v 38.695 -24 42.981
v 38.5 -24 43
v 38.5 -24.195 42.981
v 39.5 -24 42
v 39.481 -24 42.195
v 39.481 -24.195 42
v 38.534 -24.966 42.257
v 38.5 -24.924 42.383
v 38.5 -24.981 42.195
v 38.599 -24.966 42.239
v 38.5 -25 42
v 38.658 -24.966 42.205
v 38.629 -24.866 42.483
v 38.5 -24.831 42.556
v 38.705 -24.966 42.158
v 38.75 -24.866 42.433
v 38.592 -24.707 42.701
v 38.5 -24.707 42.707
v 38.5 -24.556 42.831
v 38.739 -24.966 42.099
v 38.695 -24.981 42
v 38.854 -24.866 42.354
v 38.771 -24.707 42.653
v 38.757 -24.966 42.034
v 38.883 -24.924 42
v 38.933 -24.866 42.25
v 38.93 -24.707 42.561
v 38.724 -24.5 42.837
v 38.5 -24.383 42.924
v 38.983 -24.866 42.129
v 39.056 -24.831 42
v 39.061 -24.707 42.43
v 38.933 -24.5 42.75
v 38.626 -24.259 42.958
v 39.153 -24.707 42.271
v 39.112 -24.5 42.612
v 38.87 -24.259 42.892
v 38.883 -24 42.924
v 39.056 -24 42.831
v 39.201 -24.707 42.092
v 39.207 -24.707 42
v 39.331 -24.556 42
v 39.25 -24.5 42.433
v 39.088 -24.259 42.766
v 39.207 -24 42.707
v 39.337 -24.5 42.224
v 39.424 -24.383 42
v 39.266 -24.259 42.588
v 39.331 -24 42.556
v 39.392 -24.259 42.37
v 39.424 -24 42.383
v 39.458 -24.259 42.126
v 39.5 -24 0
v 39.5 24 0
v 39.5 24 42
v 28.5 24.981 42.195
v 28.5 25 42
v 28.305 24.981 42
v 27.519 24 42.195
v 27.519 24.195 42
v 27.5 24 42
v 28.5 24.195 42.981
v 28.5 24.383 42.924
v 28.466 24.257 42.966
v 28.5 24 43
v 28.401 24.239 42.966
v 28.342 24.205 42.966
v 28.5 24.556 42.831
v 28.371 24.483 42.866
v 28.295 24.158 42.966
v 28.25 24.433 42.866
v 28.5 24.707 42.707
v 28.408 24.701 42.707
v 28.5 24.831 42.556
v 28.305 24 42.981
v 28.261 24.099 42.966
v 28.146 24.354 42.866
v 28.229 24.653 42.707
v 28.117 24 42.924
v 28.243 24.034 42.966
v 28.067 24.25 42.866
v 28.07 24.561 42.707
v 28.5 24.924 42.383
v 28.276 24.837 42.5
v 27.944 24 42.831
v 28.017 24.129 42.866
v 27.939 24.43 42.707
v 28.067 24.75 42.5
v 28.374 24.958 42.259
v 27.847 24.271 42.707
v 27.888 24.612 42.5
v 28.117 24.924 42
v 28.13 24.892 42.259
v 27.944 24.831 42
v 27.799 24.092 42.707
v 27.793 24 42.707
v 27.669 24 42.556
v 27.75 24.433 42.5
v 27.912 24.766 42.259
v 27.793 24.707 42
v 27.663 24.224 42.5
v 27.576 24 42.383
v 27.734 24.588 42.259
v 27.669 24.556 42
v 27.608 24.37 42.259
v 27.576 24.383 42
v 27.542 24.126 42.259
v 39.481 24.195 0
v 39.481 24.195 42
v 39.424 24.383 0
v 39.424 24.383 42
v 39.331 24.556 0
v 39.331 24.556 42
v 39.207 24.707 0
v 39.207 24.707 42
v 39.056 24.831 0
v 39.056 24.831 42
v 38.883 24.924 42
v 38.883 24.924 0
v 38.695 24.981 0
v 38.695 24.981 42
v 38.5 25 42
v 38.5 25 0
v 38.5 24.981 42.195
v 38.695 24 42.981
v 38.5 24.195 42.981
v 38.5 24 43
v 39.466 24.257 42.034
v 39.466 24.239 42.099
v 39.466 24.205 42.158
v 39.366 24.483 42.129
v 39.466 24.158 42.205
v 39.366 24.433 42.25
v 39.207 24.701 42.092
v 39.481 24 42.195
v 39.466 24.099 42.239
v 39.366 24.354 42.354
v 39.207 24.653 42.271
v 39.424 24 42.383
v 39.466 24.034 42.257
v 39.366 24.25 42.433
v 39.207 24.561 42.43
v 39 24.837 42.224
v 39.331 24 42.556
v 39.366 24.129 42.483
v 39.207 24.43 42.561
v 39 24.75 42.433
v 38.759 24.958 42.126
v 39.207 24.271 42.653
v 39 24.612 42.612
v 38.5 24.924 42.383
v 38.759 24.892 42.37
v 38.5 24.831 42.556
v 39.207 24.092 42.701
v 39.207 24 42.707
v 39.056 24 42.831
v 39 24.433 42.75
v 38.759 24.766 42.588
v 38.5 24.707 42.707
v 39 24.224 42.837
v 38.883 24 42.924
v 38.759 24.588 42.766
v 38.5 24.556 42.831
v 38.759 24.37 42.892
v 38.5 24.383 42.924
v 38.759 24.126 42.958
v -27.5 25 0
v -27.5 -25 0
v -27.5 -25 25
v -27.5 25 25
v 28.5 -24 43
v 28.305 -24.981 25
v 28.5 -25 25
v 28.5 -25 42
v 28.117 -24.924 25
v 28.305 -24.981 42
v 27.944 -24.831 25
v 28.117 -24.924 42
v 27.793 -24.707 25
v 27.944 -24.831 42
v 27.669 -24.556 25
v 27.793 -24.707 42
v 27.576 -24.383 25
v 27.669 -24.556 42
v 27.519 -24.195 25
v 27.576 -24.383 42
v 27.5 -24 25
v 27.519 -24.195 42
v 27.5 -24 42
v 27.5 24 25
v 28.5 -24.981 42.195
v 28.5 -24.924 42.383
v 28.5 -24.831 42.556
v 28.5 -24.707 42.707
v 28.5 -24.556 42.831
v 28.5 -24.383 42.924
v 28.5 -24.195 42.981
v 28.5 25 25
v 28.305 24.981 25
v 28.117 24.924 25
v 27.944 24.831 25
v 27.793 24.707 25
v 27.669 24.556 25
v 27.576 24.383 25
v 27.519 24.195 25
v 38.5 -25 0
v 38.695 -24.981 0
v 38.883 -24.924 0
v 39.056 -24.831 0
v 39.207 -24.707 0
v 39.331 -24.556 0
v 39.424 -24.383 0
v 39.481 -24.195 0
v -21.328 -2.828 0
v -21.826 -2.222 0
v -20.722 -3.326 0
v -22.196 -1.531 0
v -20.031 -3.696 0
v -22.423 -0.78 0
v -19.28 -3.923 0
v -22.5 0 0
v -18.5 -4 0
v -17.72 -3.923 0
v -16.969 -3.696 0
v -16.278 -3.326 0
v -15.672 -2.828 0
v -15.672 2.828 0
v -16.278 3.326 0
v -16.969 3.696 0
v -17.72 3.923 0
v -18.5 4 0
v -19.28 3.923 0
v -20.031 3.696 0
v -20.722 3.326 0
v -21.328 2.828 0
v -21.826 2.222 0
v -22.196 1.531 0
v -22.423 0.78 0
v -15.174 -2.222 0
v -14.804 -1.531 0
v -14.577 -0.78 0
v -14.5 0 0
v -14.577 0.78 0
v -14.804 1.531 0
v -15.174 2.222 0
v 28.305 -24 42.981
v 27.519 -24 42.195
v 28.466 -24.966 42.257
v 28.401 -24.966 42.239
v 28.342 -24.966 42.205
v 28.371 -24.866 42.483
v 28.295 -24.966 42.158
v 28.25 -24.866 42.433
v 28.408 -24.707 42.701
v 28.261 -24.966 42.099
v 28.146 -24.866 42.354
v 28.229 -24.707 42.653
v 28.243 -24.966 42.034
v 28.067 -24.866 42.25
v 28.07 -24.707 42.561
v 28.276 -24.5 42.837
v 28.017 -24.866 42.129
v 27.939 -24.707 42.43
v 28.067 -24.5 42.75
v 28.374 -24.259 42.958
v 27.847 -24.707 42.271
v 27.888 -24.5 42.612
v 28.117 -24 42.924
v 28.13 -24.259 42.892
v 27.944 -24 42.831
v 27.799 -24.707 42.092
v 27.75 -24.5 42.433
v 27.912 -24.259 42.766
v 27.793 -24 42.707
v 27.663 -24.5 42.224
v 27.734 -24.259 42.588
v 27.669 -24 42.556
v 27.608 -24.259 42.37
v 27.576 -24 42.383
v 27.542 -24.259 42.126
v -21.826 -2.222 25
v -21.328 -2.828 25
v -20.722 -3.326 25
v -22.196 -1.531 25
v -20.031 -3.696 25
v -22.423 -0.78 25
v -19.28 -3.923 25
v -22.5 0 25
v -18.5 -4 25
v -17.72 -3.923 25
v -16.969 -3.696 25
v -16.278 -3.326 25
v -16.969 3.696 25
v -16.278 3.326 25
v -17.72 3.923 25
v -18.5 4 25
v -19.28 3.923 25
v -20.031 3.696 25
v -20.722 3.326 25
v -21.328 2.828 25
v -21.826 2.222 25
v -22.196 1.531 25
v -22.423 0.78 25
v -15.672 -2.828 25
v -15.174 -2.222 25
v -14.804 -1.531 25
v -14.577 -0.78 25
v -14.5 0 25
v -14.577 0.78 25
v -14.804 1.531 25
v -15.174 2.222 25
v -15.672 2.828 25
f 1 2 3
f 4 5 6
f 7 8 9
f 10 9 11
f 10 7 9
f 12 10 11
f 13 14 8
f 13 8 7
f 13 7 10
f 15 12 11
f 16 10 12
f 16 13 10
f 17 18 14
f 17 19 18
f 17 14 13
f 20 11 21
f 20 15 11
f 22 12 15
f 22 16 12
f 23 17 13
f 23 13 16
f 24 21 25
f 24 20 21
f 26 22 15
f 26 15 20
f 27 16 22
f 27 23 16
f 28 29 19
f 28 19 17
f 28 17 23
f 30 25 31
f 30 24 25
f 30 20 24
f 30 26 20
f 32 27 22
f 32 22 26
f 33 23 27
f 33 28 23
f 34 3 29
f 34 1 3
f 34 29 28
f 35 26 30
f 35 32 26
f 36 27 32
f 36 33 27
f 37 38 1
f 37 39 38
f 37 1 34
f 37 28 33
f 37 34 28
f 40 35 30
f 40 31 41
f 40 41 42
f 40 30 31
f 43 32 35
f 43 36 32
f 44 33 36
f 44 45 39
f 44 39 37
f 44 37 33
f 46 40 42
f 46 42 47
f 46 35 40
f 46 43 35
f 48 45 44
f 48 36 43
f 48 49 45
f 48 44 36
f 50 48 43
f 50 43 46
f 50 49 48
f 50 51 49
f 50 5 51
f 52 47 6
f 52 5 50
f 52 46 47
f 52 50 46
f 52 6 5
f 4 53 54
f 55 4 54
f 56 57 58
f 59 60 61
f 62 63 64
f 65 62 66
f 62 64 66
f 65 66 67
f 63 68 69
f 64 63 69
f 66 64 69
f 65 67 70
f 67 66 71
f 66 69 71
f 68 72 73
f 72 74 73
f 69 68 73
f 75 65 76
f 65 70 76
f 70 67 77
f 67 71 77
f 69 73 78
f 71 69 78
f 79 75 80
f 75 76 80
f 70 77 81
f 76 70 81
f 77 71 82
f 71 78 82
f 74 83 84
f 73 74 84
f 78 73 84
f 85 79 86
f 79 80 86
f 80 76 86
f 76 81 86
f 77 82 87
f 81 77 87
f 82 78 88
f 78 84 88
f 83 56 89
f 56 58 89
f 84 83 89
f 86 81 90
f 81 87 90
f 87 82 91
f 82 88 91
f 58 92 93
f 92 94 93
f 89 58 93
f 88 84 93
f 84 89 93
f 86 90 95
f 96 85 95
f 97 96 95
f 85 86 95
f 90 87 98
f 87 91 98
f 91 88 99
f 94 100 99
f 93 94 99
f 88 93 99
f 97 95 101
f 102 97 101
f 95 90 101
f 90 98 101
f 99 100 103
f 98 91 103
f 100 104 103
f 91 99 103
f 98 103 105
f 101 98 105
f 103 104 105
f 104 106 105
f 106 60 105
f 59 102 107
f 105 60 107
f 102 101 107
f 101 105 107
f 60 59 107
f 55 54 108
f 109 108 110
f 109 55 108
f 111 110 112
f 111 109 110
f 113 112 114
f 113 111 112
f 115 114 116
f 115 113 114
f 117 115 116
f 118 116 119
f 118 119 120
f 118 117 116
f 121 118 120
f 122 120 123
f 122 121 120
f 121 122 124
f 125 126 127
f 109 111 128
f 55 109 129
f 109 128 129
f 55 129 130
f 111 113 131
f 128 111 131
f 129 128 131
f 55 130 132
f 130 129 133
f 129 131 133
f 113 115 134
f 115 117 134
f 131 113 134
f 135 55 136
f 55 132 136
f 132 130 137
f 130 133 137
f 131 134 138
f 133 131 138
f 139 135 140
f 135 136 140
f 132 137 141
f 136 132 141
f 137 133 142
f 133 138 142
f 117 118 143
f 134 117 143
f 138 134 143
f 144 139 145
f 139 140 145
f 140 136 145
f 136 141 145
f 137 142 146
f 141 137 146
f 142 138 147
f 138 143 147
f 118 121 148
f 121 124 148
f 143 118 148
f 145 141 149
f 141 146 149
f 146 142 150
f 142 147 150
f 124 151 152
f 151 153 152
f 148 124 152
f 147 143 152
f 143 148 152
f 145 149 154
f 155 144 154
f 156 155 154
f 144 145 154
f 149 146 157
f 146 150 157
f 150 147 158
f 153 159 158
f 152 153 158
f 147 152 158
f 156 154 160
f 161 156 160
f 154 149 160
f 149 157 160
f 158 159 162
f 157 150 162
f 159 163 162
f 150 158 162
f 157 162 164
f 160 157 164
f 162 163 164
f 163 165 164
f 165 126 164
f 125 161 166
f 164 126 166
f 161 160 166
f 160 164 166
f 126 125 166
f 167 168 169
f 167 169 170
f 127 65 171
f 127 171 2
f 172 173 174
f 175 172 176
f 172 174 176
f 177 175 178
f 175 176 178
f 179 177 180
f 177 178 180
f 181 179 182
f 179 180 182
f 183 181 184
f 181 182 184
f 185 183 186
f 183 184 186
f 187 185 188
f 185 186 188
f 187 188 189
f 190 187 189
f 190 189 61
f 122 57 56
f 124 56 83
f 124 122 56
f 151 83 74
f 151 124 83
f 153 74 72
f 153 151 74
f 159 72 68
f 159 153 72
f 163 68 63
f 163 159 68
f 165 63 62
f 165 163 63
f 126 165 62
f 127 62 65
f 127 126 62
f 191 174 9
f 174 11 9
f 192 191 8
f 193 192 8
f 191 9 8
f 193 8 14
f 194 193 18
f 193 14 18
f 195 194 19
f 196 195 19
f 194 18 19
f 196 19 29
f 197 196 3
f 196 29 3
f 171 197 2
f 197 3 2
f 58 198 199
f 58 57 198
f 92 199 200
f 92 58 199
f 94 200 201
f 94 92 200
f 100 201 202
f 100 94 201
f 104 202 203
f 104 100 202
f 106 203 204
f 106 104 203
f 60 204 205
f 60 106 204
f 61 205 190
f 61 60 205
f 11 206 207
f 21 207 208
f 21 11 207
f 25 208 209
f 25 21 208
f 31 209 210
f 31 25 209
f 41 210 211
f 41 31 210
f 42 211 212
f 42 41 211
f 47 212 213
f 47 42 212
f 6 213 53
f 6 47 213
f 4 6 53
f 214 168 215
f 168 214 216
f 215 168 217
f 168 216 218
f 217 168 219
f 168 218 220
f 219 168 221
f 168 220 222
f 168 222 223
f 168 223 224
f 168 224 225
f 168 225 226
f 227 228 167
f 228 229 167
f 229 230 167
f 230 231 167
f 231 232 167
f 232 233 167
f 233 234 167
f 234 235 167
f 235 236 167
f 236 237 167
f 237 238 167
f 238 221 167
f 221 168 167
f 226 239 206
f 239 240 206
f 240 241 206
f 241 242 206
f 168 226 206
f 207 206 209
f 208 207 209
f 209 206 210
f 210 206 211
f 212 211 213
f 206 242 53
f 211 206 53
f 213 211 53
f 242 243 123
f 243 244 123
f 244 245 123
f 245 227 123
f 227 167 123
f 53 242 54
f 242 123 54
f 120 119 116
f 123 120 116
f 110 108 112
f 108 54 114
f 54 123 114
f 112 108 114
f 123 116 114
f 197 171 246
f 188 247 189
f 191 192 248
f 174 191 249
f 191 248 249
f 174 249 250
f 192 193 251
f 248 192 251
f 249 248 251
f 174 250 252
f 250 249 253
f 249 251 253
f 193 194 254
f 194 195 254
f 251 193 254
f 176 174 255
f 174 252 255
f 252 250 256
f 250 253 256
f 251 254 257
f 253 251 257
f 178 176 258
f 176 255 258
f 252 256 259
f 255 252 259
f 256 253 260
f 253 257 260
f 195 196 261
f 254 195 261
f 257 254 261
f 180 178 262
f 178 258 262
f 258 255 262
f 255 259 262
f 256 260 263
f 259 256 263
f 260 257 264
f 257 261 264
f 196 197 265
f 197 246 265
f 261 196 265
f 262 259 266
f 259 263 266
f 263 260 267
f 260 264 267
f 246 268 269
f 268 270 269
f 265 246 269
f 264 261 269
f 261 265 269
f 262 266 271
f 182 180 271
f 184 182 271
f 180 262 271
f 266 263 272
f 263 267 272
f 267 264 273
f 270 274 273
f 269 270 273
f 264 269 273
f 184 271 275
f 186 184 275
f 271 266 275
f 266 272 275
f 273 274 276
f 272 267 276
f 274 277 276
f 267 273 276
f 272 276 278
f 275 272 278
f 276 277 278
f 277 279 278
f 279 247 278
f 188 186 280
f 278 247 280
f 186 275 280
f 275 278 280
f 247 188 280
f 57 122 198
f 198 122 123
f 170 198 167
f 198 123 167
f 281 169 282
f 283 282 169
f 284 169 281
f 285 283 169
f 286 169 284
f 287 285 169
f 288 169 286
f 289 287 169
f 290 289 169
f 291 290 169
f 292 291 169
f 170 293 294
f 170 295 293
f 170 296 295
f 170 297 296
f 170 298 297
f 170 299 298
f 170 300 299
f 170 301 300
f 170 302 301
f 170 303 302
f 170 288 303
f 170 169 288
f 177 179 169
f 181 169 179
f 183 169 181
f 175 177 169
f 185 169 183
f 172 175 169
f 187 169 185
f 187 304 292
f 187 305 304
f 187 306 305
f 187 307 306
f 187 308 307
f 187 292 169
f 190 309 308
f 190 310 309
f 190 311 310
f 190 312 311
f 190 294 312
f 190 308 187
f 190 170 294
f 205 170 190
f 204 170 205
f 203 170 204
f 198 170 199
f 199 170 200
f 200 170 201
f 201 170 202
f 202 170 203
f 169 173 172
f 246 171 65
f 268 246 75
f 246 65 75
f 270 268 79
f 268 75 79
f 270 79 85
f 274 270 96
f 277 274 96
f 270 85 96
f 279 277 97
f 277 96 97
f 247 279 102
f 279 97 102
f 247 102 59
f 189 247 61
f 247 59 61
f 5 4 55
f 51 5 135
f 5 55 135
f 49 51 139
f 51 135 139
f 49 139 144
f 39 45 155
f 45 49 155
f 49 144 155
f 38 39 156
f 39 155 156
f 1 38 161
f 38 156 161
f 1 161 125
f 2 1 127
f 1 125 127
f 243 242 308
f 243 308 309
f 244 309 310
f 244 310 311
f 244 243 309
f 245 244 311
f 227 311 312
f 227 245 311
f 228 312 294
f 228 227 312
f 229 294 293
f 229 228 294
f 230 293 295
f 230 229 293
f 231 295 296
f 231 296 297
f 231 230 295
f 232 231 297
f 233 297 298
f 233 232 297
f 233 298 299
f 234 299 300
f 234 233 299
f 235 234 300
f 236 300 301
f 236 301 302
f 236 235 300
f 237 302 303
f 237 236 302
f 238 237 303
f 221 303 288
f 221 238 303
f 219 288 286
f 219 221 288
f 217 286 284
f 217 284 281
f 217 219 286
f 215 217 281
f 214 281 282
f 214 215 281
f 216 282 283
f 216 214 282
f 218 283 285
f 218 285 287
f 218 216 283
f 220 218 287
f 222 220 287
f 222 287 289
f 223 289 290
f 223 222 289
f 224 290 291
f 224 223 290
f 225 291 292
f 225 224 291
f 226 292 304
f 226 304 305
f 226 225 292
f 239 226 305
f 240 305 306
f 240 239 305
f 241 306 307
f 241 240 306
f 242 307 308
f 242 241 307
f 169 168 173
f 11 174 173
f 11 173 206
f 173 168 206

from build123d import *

# Parameters (mm, degrees)
F0_W     = 55
F0_H     = 50
F0_R     = 4
F0_W_2   = 12
F1_DEPTH = 25
F2_DEPTH = 43
F3_R     = 1


with BuildPart() as f1:
    # F0 (on Top) → F1 (new body)
    with BuildSketch(Plane.XY):
        Rectangle(F0_W, F0_H)
        with Locations((-18.5, 0)):
            Circle(F0_R, mode=Mode.SUBTRACT)
        with Locations((33.5, 0)):
            Rectangle(F0_W_2, F0_H)
    extrude(amount=F1_DEPTH)

    # F0 (on Top) → F2 (join)
    with BuildSketch(Plane.XY):
        with Locations((33.5, 0)):
            Rectangle(F0_W_2, F0_H)
    extrude(amount=F2_DEPTH)

    # F3
    f3_edges = [f1.edges().sort_by_distance(p)[0] for p in [
        (27.5, 25, 34),
        (33.5, 25, 43),
        (39.5, 25, 21.5),
        (39.5, 0, 43),
        (27.5, 0, 43),
        (33.5, -25, 43),
        (27.5, -25, 34),
        (39.5, -25, 21.5),
    ]]
    fillet(f3_edges, radius=F3_R)


solid = f1.part
